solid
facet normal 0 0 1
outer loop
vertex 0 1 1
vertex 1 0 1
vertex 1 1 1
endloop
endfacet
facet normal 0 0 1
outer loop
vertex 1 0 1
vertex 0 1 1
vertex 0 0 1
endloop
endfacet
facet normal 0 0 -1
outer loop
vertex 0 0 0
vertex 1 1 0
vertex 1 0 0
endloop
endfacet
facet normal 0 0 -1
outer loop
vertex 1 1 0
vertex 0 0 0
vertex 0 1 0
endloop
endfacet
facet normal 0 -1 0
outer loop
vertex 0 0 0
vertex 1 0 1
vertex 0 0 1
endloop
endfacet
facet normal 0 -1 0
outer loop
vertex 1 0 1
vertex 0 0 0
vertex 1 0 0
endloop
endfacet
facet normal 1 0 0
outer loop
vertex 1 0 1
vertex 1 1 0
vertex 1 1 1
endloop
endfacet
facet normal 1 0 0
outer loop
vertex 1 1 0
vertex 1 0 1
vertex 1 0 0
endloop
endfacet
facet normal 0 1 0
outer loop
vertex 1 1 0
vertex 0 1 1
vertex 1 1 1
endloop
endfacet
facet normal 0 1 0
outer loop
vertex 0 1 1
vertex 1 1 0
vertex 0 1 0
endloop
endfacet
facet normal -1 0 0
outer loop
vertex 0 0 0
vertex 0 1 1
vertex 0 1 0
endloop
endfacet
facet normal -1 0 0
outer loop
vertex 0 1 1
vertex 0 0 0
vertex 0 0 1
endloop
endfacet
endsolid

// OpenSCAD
// file: Data.scad
dust=0;
filament=0;
gas=0;
star =
[
	[1.4,31.4,3,1063.653075],
	[4.5,92.6,3,1228.004618],
	[6,88.7,3,1063.653075],
	[6.7,74.7,3,1315.830655],
	[6.7,74.7,3,1130.316325],
	[8.9,17.9,3,2441.181106],
	[18.3,45.3,4,1475.027102],
	[20.8,98.9,3,1742.60919],
	[20.8,98.9,3,1611.387536],
	[22.2,46.1,4,3212.180934],
	[22.5,19.8,4,3518.843888],
	[23.6,18.8,4,16338.04169],
	[23.8,23.7,4,1310.991875],
	[23.8,23.7,4,1279.970617],
	[25.9,43,4,1958.844674],
	[27.8,68.5,4,1307.37447],
	[29.4,51.6,4,1090.435546],
	[31.5,34.9,3,22511.27016],
	[32.4,19.4,4,4195.657223],
	[32.6,38.1,3,7641.87624],
	[32.7,84.7,3,1618.825363],
	[34.7,42.9,3,7008.095316],
	[36.2,36.2,3,7184.557088],
	[37,35.7,3,4604.685784],
	[37.1,35.8,3,15617.08593],
	[38.9,38.2,3,6432.799273],
	[39.5,45,3,2839.226239],
	[43.9,97.6,3,11107.08256],
	[44.3,41.4,3,1274.089686],
	[45.2,61.3,3,9453.66046],
	[45.6,40.4,3,1509.384897],
	[45.6,40.4,3,1319.471457],
	[45.7,95.3,3,4685.975353],
	[48.2,78.1,3,1253.141175],
	[48.2,78.1,3,1302.566786],
	[48.7,72.2,3,1470.957077],
	[53.1,51.5,3,32448.90157],
	[56.1,0.9,3,3087.450476],
	[61,65.9,3,2135.99386],
	[61,65.9,4,2135.99386],
	[61.7,57.5,4,3787.913038],
	[62.7,45.1,4,1154.516117],
	[62.7,45.1,4,1102.554332],
	[66.8,55.6,4,1630.797361],
	[68.8,76.5,3,14521.11618],
	[68.9,76.5,3,4393.392456],
	[75.7,21.5,3,1986.094917],
	[78.9,100,3,62172.73893],
	[81.1,94,3,3144.850465],
	[84.3,18.4,3,2208.004733],
];
data = [star,filament,gas,dust];
// file: braille_font.scad
/*
Braille Module
http://creativecommons.org/licenses/by/3.0/
*/


// mm sizes from http://dots.physics.orst.edu/gs_layout.html
radius = 0.25;
spacing = 2.5;
distance = 3.75 + spacing;

plate_height = 10;
plate_thickness = 2;

$fn=35;



module letter(bitmap) {
	row_size = 2;
	col_size = 3;
	bitmap_size = row_size * col_size;
	
	function loc_x(loc) = floor(loc / row_size) * spacing + spacing;
	function loc_y(loc) = loc % row_size * spacing  + (distance-spacing)/2;

	for (loc = [0:bitmap_size - 1]) {
		if (bitmap[loc] != 0) {
			union() {
				translate(v = [loc_x(loc), loc_y(loc), 0]) {
					sphere(radius = radius* bitmap[loc], center = true);
				}
			}
		}
	}
}


module braille_char(char) {
	if (char == "A") {
		letter([
			1,0,
			0,0,
			0,0
		]);
	} else if (char == "B") {
		letter([
			1,0,
			1,0,
			0,0
		]);
	} else if (char == "C") {
		letter([
			1,1,
			0,0,
			0,0
		]);
	} else if (char == "D") {
		letter([
			1,1,
			0,1,
			0,0
		]);
	} else if (char == "E") {
		letter([
			1,0,
			0,1,
			0,0
		]);
	} else if (char == "F") {
		letter([
			1,1,
			1,0,
			0,0
		]);
	} else if (char == "G") {
		letter([
			1,1,
			1,1,
			0,0
		]);
	} else if (char == "H") {
		letter([
			1,0,
			1,1,
			0,0
		]);
	} else if (char == "I") {
		letter([
			0,1,
			1,0,
			0,0
		]);
	} else if (char == "J") {
		letter([
			0,1,
			1,1,
			0,0
		]);
	} else if (char == "K") {
		letter([
			1,0,
			0,0,
			1,0
		]);
	} else if (char == "L") {
		letter([
			1,0,
			1,0,
			1,0
		]);
	} else if (char == "M") {
		letter([
			1,1,
			0,0,
			1,0
		]);
	} else if (char == "N") {
		letter([
			1,1,
			0,1,
			1,0
		]);
	} else if (char == "O") {
		letter([
			1,0,
			0,1,
			1,0
		]);
	} else if (char == "P") {
		letter([
			1,1,
			1,0,
			1,0
		]);
	} else if (char == "Q") {
		letter([
			1,1,
			1,1,
			1,0
		]);
	} else if (char == "R") {
		letter([
			1,0,
			1,1,
			1,0
		]);
	} else if (char == "S") {
		letter([
			0,1,
			1,0,
			1,0
		]);
	} else if (char == "T") {
		letter([
			0,1,
			1,1,
			1,0
		]);
	} else if (char == "U") {
		letter([
			1,0,
			0,0,
			1,1
		]);
	} else if (char == "V") {
		letter([
			1,0,
			1,1,
			1,0
		]);
	} else if (char == "W") {
		letter([
			0,1,
			1,1,
			0,1
		]);
	} else if (char == "X") {
		letter([
			1,1,
			0,0,
			1,1
		]);
	} else if (char == "Y") {
		letter([
			1,1,
			0,1,
			1,1
		]);
	} else if (char == "Z") {
		letter([
			1,0,
			0,1,
			1,1
		]);
	} else {
		echo("Invalid Character: ", char);
	}

}

module braille_str(chars, char_count) {
	echo(str("Total Width: ", distance * char_count, "mm"));
	union() {
		for (count = [0:char_count-1]) {
			translate(v = [0, count * distance, plate_thickness]) {
				braille_char(chars[count]);
			}
		}
		translate(v = [0, -distance/2, 0]) {
			cube(size = [plate_height, distance * (char_count+1), plate_thickness]);
		}
	}
}






chars = ["C", "A", "R", "P", "E", " ", "D", "I", "E", "M" ];
char_count = 10;

union()
{
	rotate([0,90,0]) braille_str(chars, char_count);
	// uncomment next line to have a small "foot" added for better adhesion to the print platform or raft
	//translate([-19,20,-plate_height]) cube(size = [20,5,2]);
}
// main file
use <braille_font.scad>;
use <Data.scad>;
fn = 3;
pillar_diameter = 6.35;
pillar_radius = pillar_diameter/2;
pillar_height = 70;
base_boundaries = ([100,120,5]);
Title = 10;
max_plate_height = base_boundaries[2];
max_plate_height = 3;


braille_radius = 1;
braille_plate_height = 10;
braille_plate_thickness = 2;
spacing = 2.5;
distance = 3.75 + spacing;
Emboss = 2;

scaling = (.90);
transX = (5);
transY = (3);

move = -90.230965;
inkscale = 2.538071037;


star =
[
	[1.4,31.4,3,1063.653075],
	[4.5,92.6,3,1228.004618],
	[6,88.7,3,1063.653075],
	[6.7,74.7,3,1315.830655],
	[6.7,74.7,3,1130.316325],
	[8.9,17.9,3,2441.181106],
	[18.3,45.3,4,1475.027102],
	[20.8,98.9,3,1742.60919],
	[20.8,98.9,3,1611.387536],
	[22.2,46.1,4,3212.180934],
	[22.5,19.8,4,3518.843888],
	[23.6,18.8,4,16338.04169],
	[23.8,23.7,4,1310.991875],
	[23.8,23.7,4,1279.970617],
	[25.9,43,4,1958.844674],
	[27.8,68.5,4,1307.37447],
	[29.4,51.6,4,1090.435546],
	[31.5,34.9,3,22511.27016],
	[32.4,19.4,4,4195.657223],
	[32.6,38.1,3,7641.87624],
	[32.7,84.7,3,1618.825363],
	[34.7,42.9,3,7008.095316],
	[36.2,36.2,3,7184.557088],
	[37,35.7,3,4604.685784],
	[37.1,35.8,3,15617.08593],
	[38.9,38.2,3,6432.799273],
	[39.5,45,3,2839.226239],
	[43.9,97.6,3,11107.08256],
	[44.3,41.4,3,1274.089686],
	[45.2,61.3,3,9453.66046],
	[45.6,40.4,3,1509.384897],
	[45.6,40.4,3,1319.471457],
	[45.7,95.3,3,4685.975353],
	[48.2,78.1,3,1253.141175],
	[48.2,78.1,3,1302.566786],
	[48.7,72.2,3,1470.957077],
	[53.1,51.5,3,32448.90157],
	[56.1,0.9,3,3087.450476],
	[61,65.9,3,2135.99386],
	[61,65.9,4,2135.99386],
	[61.7,57.5,4,3787.913038],
	[62.7,45.1,4,1154.516117],
	[62.7,45.1,4,1102.554332],
	[66.8,55.6,4,1630.797361],
	[68.8,76.5,3,14521.11618],
	[68.9,76.5,3,4393.392456],
	[75.7,21.5,3,1986.094917],
	[78.9,100,3,62172.73893],
	[81.1,94,3,3144.850465],
	[84.3,18.4,3,2208.004733],
];

gasses =
[
	[21.2,36,0      ,240.6,0      ,120.3,360.9],
	[26,40.7,0      ,195.8,0      ,97.9,293.7],
	[26,36,0      ,188.1333333,0      ,94.06666667,282.2],
	[30.5,55.1,0      ,77.2,0      ,38.6,115.8],
	[30.5,50.3,0      ,116.2666667,0      ,58.13333333,174.4],
	[30.5,45.5,0      ,146.4666667,0      ,73.23333333,219.7],
	[30.5,40.7,0      ,127.8666667,0      ,63.93333333,191.8],
	[30.5,36,0      ,285.8666667,0      ,142.9333333,428.8],
	[30.5,31.2,0      ,185,0      ,92.5,277.5],
	[35.3,50.3,0      ,105.2666667,0      ,52.63333333,157.9],
	[35.3,45.5,0      ,112.6666667,0      ,56.33333333,169],
	[35.3,40.7,0      ,116.6,0      ,58.3,174.9],
	[35.3,36,0      ,303.5333333,0      ,151.7666667,455.3],
	[35.3,31.2,0      ,254.2,0      ,127.1,381.3],
	[39.9,50.3,0      ,76.13333333,0      ,38.06666667,114.2],
	[39.9,45.5,0      ,205,0      ,102.5,307.5],
	[39.9,40.7,0      ,118.4,0      ,59.2,177.6],
	[39.9,36,0      ,163.4,0      ,81.7,245.1],
	[39.9,31.2,0      ,208.9333333,0      ,104.4666667,313.4],
	[39.9,26.4,0      ,213.8666667,0      ,106.9333333,320.8],
	[44.7,59.9,0      ,104.4,0      ,52.2,156.6],
	[44.7,55.1,0      ,105.2,0      ,52.6,157.8],
	[44.7,50.3,0      ,107.5333333,0      ,53.76666667,161.3],
	[44.7,45.5,0      ,144.5333333,0      ,72.26666667,216.8],
	[44.7,40.7,0      ,158.8,0      ,79.4,238.2],
	[44.7,36,0      ,154.0666667,0      ,77.03333333,231.1],
	[44.7,31.2,0      ,164.7333333,0      ,82.36666667,247.1],
	[44.7,26.4,0      ,172,0      ,86,258],
	[44.7,21.6,0      ,151.5333333,0      ,75.76666667,227.3],
	[49.2,69.4,0      ,88.26666667,0      ,44.13333333,132.4],
	[49.2,64.6,0      ,99.4,0      ,49.7,149.1],
	[49.2,59.9,0      ,97.93333333,0      ,48.96666667,146.9],
	[49.2,55.1,0      ,127.8,0      ,63.9,191.7],
	[49.2,50.3,0      ,113.6,0      ,56.8,170.4],
	[49.2,45.5,0      ,143.2666667,0      ,71.63333333,214.9],
	[49.2,40.7,0      ,180.3333333,0      ,90.16666667,270.5],
	[49.2,36,0      ,136.8666667,0      ,68.43333333,205.3],
	[49.2,31.2,0      ,142.4666667,0      ,71.23333333,213.7],
	[49.2,26.4,0      ,144.3333333,0      ,72.16666667,216.5],
	[49.2,21.6,0      ,112.3333333,0      ,56.16666667,168.5],
	[54,69.4,0      ,96.26666667,0      ,48.13333333,144.4],
	[54,64.6,0      ,106.2,0      ,53.1,159.3],
	[54,59.9,0      ,111.7333333,0      ,55.86666667,167.6],
	[54,55.1,0      ,145.2666667,0      ,72.63333333,217.9],
	[54,50.3,0      ,226.0666667,0      ,113.0333333,339.1],
	[54,45.5,0      ,165.0666667,0      ,82.53333333,247.6],
	[54,40.7,0      ,181.4,0      ,90.7,272.1],
	[54,36,0      ,131.1333333,0      ,65.56666667,196.7],
	[54,31.2,0      ,143.7333333,0      ,71.86666667,215.6],
	[54,26.4,0      ,130.5333333,0      ,65.26666667,195.8],
	[54,21.6,0      ,111.5333333,0      ,55.76666667,167.3],
	[54,16.8,0      ,112.2666667,0      ,56.13333333,168.4],
	[58.6,59.9,0      ,152.0666667,0      ,76.03333333,228.1],
	[58.6,55.1,0      ,167.7333333,0      ,83.86666667,251.6],
	[58.6,50.3,0      ,120.6666667,0      ,60.33333333,181],
	[58.6,45.5,0      ,149.6,0      ,74.8,224.4],
	[58.6,40.7,0      ,125.8666667,0      ,62.93333333,188.8],
	[58.6,36,0      ,115.4666667,0      ,57.73333333,173.2],
	[58.6,31.2,0      ,124.6666667,0      ,62.33333333,187],
	[58.6,26.4,0      ,114.4666667,0      ,57.23333333,171.7],
	[58.6,21.6,0      ,99.13333333,0      ,49.56666667,148.7],
	[58.6,16.8,0      ,83.4,0      ,41.7,125.1],
	[63.4,45.5,0      ,133.3333333,0      ,66.66666667,200],
	[63.4,40.7,0      ,110.4,0      ,55.2,165.6],
	[63.4,36,0      ,86.66666667,0      ,43.33333333,130],
	[63.4,31.2,0      ,88.13333333,0      ,44.06666667,132.2],
	[63.4,26.4,0      ,93.6,0      ,46.8,140.4],
	[67.9,40.7,0      ,119.3333333,0      ,59.66666667,179],
	[67.9,36,0      ,75.86666667,0      ,37.93333333,113.8],
	[67.9,26.4,0      ,82.4,0      ,41.2,123.6]
];

dust =
[
	[2.4,40.7,0      ,12.92,0      ,25.84,38.76],
	[2.4,45.5,0      ,12.70666667,0      ,25.41333333,38.12],
	[2.4,50.3,0      ,25.19,0      ,50.38,75.57],
	[2.4,55.1,0      ,10.28,0      ,20.56,30.84],
	[7.1,36,0      ,18.86666667,0      ,37.73333333,56.6],
	[7.1,40.7,0      ,13.72,0      ,27.44,41.16],
	[7.1,45.5,0      ,15.14333333,0      ,30.28666667,45.43],
	[7.1,50.3,0      ,26.64,0      ,53.28,79.92],
	[7.1,55.1,0      ,11.26666667,0      ,22.53333333,33.8],
	[7.1,59.9,0      ,10.60333333,0      ,21.20666667,31.81],
	[7.1,64.7,0      ,10.22,0      ,20.44,30.66],
	[11.9,45.5,0      ,13.76333333,0      ,27.52666667,41.29],
	[11.9,50.3,0      ,14.28,0      ,28.56,42.84],
	[11.9,55.1,0      ,13.13333333,0      ,26.26666667,39.4],
	[11.9,59.9,0      ,12.94333333,0      ,25.88666667,38.83],
	[11.9,64.7,0      ,14.42666667,0      ,28.85333333,43.28],
	[11.9,69.5,0      ,10.07,0      ,20.14,30.21],
	[16.4,50.3,0      ,17.34333333,0      ,34.68666667,52.03],
	[16.4,55.1,0      ,15.64666667,0      ,31.29333333,46.94],
	[16.4,59.9,0      ,12.51333333,0      ,25.02666667,37.54],
	[16.4,64.7,0      ,10.09,0      ,20.18,30.27],
	[16.4,69.5,0      ,9.65,0      ,19.3,28.95],
	[21.2,59.9,0      ,12.08333333,0      ,24.16666667,36.25],
	[21.2,64.7,0      ,10.35333333,0      ,20.70666667,31.06],
	[21.2,69.5,0      ,11.56333333,0      ,23.12666667,34.69],
	[21.2,16.8,0      ,16.18333333,0      ,32.36666667,48.55],
	[26,12,0      ,18.42,0      ,36.84,55.26],
	[30.6,12,0      ,18.97333333,0      ,37.94666667,56.92],
	[35.3,12,0      ,17.02666667,0      ,34.05333333,51.08],
	[39.9,7.2,0      ,16.82333333,0      ,33.64666667,50.47],
	[44.7,7.2,0      ,17.27,0      ,34.54,51.81],
	[49.3,7.2,0      ,16.06333333,0      ,32.12666667,48.19],
	[54,2.4,0      ,12.3,0      ,24.6,36.9],
	[54,7.2,0      ,15.23,0      ,30.46,45.69],
	[58.6,2.4,0      ,14.34,0      ,28.68,43.02],
	[58.6,7.2,0      ,14.12,0      ,28.24,42.36],
	[58.6,12,0      ,16.05666667,0      ,32.11333333,48.17],
	[63.4,7.2,0      ,13.92666667,0      ,27.85333333,41.78],
	[63.4,12,0      ,11.73,0      ,23.46,35.19],
	[68,7.2,0      ,11.29,0      ,22.58,33.87],
	[68,12,0      ,10.49666667,0      ,20.99333333,31.49],
	[72.7,7.2,0      ,12.91666667,0      ,25.83333333,38.75],
	[72.7,12,0      ,14.52,0      ,29.04,43.56],
	[72.7,16.8,0      ,10.63333333,0      ,21.26666667,31.9],
	[72.7,21.6,0      ,12.51666667,0      ,25.03333333,37.55],
	[77.3,16.8,0      ,10.56333333,0      ,21.12666667,31.69],
	[77.3,21.6,0      ,12.54333333,0      ,25.08666667,37.63],
	[77.3,36,0      ,11.28333333,0      ,22.56666667,33.85],
	[77.3,74.2,0      ,12.27333333,0      ,24.54666667,36.82],
	[82.1,16.8,0      ,11.57333333,0      ,23.14666667,34.72],
	[82.1,21.6,0      ,8.926666667,0      ,17.85333333,26.78],
	[82.1,40.7,0      ,12.83333333,0      ,25.66666667,38.5],
	[82.1,45.5,0      ,12.26666667,0      ,24.53333333,36.8],
	[82.1,79,0      ,9.263333333,0      ,18.52666667,27.79],
	[86.7,16.8,0      ,8.976666667,0      ,17.95333333,26.93],
	[86.7,21.6,0      ,9.14,0      ,18.28,27.42],
	[86.7,59.9,0      ,14.07,0      ,28.14,42.21],
	[86.7,69.5,0      ,6.833333333,0      ,13.66666667,20.5],
	[91.4,21.6,0      ,11.16333333,0      ,22.32666667,33.49],
	[91.4,26.4,0      ,12.84666667,0      ,25.69333333,38.54],
	[91.4,31.2,0      ,10.58333333,0      ,21.16666667,31.75],
	[96,31.2,0      ,14.58333333,0      ,29.16666667,43.75],
	[96,36,0      ,20.15,0      ,40.3,60.45]
];


gas_dust=
[
	[11.8,40.7,0      ,74.7,0      ,74.7,149.4],
	[11.8,31.2,0      ,74.35,0      ,74.35,148.7],
	[21.2,55.1,0      ,65.95,0      ,65.95,131.9],
	[21.2,50.3,0      ,74.35,0      ,74.35,148.7],
	[21.2,21.6,0      ,76.35,0      ,76.35,152.7],
	[26,16.8,0      ,69.65,0      ,69.65,139.3],
	[30.5,26.4,0      ,228.6,0      ,228.6,457.2],
	[35.3,26.4,0      ,225,0      ,225,450],
	[35.3,21.6,0      ,178.55,0      ,178.55,357.1],
	[39.9,21.6,0      ,133.95,0      ,133.95,267.9],
	[39.9,12,0      ,65.4,0      ,65.4,130.8],
	[44.7,12,0      ,68.75,0      ,68.75,137.5],
	[58.6,74.2,0      ,51.25,0      ,51.25,102.5],
	[63.4,74.2,0      ,56.5,0      ,56.5,113],
	[67.9,74.2,0      ,93.75,0      ,93.75,187.5],
	[72.7,74.2,0      ,63.3,0      ,63.3,126.6],
	[72.7,59.9,0      ,115.6,0      ,115.6,231.2],
	[72.7,55.1,0      ,101.95,0      ,101.95,203.9],
	[72.7,50.3,0      ,89.15,0      ,89.15,178.3],
	[77.3,69.4,0      ,75.9,0      ,75.9,151.8],
	[77.3,64.6,0      ,105.4,0      ,105.4,210.8],
	[77.3,59.9,0      ,110.5,0      ,110.5,221],
	[77.3,55.1,0      ,96.35,0      ,96.35,192.7],
	[77.3,50.3,0      ,93.55,0      ,93.55,187.1],
	[77.3,45.5,0      ,80.4,0      ,80.4,160.8],
	[77.3,40.7,0      ,64.45,0      ,64.45,128.9],
	[82.1,64.6,0      ,60.45,0      ,60.45,120.9],
	[82.1,59.9,0      ,79.75,0      ,79.75,159.5],
	[82.1,55.1,0      ,83.3,0      ,83.3,166.6],
	[82.1,50.3,0      ,73.85,0      ,73.85,147.7]
];


module triangle (s,h) {
//r=(s/2)/sin(60);
r = s;
	linear_extrude(height = h){
		polygon(points=[[-sin(60)*r,-sin(30)*r],[sin(60)*r,-sin(30)*r],[0,r]],triangle=[[0,1,2]]);
	}
}

Standard = 5;
//X-cord,Y-cord,Layer,Intensity

module star(Standard,Intensity,loc){
Intensity2=Intensity*4-4;
	translate([loc[0],loc[1],0]){
		scale([1,1,1]){
			color("Purple")linear_extrude(height=Intensity2)circle(Standard*.8,$fn=fn);
		}
	}
}

module gas(Standard,x,y,z){
	translate([x,y,0]){
		scale([1,1,1]){
			color("Magenta")cube([Standard,Standard,z]);
		}
	}
}

module object(Standard,x,y,z){
	translate([x,y,z/2]){
		scale([1,1,1]){
			cube([Standard,Standard,z],center=true);
		}
	}
}

module drawing(i){
	if(i==1){
		scale(scaling/.95){
			translate([0,move,base_boundaries[2]/2]){
				scale(inkscale){
					color("Blue")linear_extrude(file = "v4_NGC_602.dxf", height = Emboss, layer = "Filaments");
				}
			}
		}
	}
	if(i==2||i==3||i==4){
		scale(scaling/.95){
			translate([0,move,base_boundaries[2]/2]){
				scale(inkscale){
					color("Red")linear_extrude(file = "v4_NGC_602.dxf", height = Emboss, layer = "Gasses");
				}
			}
		}
		scale(scaling/.95){
			translate([0,move,base_boundaries[2]/2]){
				scale(inkscale){
					color("White")linear_extrude(file = "v4_NGC_602.dxf", height = Emboss, layer = "Dust");
				}
			}
		}
	}
}

module drawing2(i){
	if(i==1){
		scale(scaling/.95){
			translate([0,move,base_boundaries[2]/2]){
				scale(inkscale){
					color("Blue")linear_extrude(file = "v4_NGC_602.dxf", height = Emboss, layer = "Filaments");
				}
			}
		}
	}
	if(i==2||i==3||i==4){
		scale(scaling/.95){
			translate([0,move,base_boundaries[2]/2]){
				scale(inkscale){
					color("Red")linear_extrude(file = "v4_NGC_602.dxf", height = Emboss, layer = "Gasses_t");
				}
			}
		}
		scale(scaling/.95){
			translate([0,move,base_boundaries[2]/2]){
				scale(inkscale){
					color("White")linear_extrude(file = "v4_NGC_602.dxf", height = Emboss, layer = "Dust_t");
				}
			}
		}
		scale(scaling/.95){
			translate([0,17.687,base_boundaries[2]/2]){
				scale(inkscale){
					color("Blue")linear_extrude(file = "v4_NGC_602.dxf", height = Emboss+1, layer = "Gas_Dust_t");
				}
			}
		}
	}
}

module drawing3(i){
k=2;
K=120/2/k;
h=3;
H=120/2/h;
	if(i==1){
		scale(scaling/.95){
			translate([0,move,base_boundaries[2]/2]){
				scale(inkscale){
					color("Blue")linear_extrude(file = "v4_NGC_602.dxf", height = Emboss, layer = "Filaments");
				}
			}
		}
	}
	if(i==2||i==3||i==4){
		//intersection(){
			scale(scaling/.95){
				translate([0,move,base_boundaries[2]/2]){
					scale(inkscale){
						color("Red")linear_extrude(file = "v5_NGC_602.dxf", height =(Emboss)/inkscale/.95, layer = "Gasses_t");
					}
				}
			}
//			for(i=[0:H]){
//				translate([i*2*h,0,0]){
//					for(i=[0:H]){
//						translate([0,i*2*h,base_boundaries[2]/2]){
//							triangle(h,(Emboss*3));
//						}
//					}
//				}
//			}
//
//		}
		//intersection(){
			scale(scaling/.95){
				translate([0,move,base_boundaries[2]/2/.95]){
					scale(inkscale){
						color("green")linear_extrude(file = "v5_NGC_602.dxf", height = (Emboss*3)/inkscale/.95, layer = "Dust_t");
					}
				}
			}
//			for(i=[0:K]){
//				translate([0,i*2*k,base_boundaries[2]/2]){
//					cube([120,k,(Emboss*3)]);
//				}
//			}
//		}
		//intersection(){
			scale(scaling/.95){
				translate([0,17.687,base_boundaries[2]/2]){
					scale(inkscale){
						color("Blue")linear_extrude(file = "v5_NGC_602.dxf", height = (Emboss*2)/inkscale, layer = "Gas_Dust_t");
					}
				}
			}
//			for(i=[0:K]){
//				translate([i*2*k,0,base_boundaries[2]/2]){
//					cube([k,120,Emboss*3]);
//				}
//			}
//		}
	}
}

module tab(thickness){
	linear_extrude(height=thickness){
		difference(){
			hull(){
				circle(pillar_radius*2,$fn=fn);
				translate([pillar_radius,pillar_radius,0]){
					intersection(){
						circle(pillar_radius*2.832,$fn=fn);
						square(pillar_radius*4);
					}
				}
			}
			circle(pillar_radius,$fn=fn);
			translate([pillar_radius*3,pillar_radius*3,0]){
				rotate([0,0,45]){
					square(pillar_radius*5,center = true);
				}
			}
		}
	}
}

module pillar(pillar_radius,pillar_height){
	linear_extrude(height=pillar_height){
		circle(pillar_radius,$fn=fn);
	}
}

module base(){
	translate([0,0,0]){
		cube([base_boundaries[0],base_boundaries[1]-pillar_radius*3,base_boundaries[2]]);
	}
	translate([pillar_radius*2,base_boundaries[1]-pillar_radius*2,0]){
		rotate([0,0,-135]){
			tab(base_boundaries[2]);
		}
	}
	translate([base_boundaries[0]-pillar_radius*2,base_boundaries[1]-pillar_radius*2,0]){
		rotate([0,0,-135]){
			tab(base_boundaries[2]);
		}
	}
	translate([pillar_radius*2,base_boundaries[1]-pillar_radius*2,0]){
		pillar(pillar_radius,pillar_height);
	}
	translate([base_boundaries[0]-pillar_radius*2,base_boundaries[1]-pillar_radius*2,0]){
		pillar(pillar_radius,pillar_height);
	}
}



module plate(){
	difference(){
		translate([0,0,0]){
			cube([base_boundaries[0],base_boundaries[1]-pillar_radius*3,base_boundaries[2]-braille_radius]);
		}
		translate([-1,-1,base_boundaries[2]/2]){
			cube([base_boundaries[0]+2,base_boundaries[1]-pillar_radius*3-Title+1,base_boundaries[2]]);
		}
	}
	translate([pillar_radius*2,base_boundaries[1]-pillar_radius*2,0]){
		rotate([0,0,-135]){
			tab(max_plate_height);
		}
	}
	translate([base_boundaries[0]-pillar_radius*2,base_boundaries[1]-pillar_radius*2,0]){
		rotate([0,0,-135]){
			tab(max_plate_height);
		}
	}
}

module plate1(){
	chars = ["O", "N", "E"];
	char_count = 3;
	Total_width = distance*char_count+distance;

	translate([distance/2+base_boundaries[0]/2-Total_width/2,braille_plate_height+base_boundaries[1]-pillar_radius*3-Title,base_boundaries[2]-braille_plate_thickness-braille_radius]){
		rotate ([0,0,-90]){
			braille_str(chars, char_count);
		}
	}
	plate();
	translate([transX,transY,0]){
		drawing2(1);
	}
}

module plate2(){
	chars = ["T", "W", "O"];
	char_count = 3;
	Total_width = distance*char_count+distance;

	translate([distance/2+base_boundaries[0]/2-Total_width/2,braille_plate_height+base_boundaries[1]-pillar_radius*3-Title,base_boundaries[2]-braille_plate_thickness-braille_radius]){
		rotate ([0,0,-90]){
			braille_str(chars, char_count);
		}
	}
	plate();
	translate([transX,transY,0]){
		drawing3(2);
	}
}

module plate3(){
	chars = ["T", "H", "R", "E", "E"];
	char_count = 5;
	Total_width = distance*char_count+distance;

	translate([distance/2+base_boundaries[0]/2-Total_width/2,braille_plate_height+base_boundaries[1]-pillar_radius*3-Title,base_boundaries[2]-braille_plate_thickness-braille_radius]){
		rotate ([0,0,-90]){
			braille_str(chars, char_count);
		}
	}
	plate();
	translate([transX,transY,0]){
		scale([scaling,scaling,1]){
			for(i=[0:49]){
				if(star[i][2]==3){
					star(Standard,log(star[i][3])+.75,star[i]);
				}
			}
		}
	drawing3(3);
	}
}

module plate4(){
	chars = ["F", "O", "U", "R"];
	char_count = 4;
	Total_width = distance*char_count+distance;

	translate([distance/2+base_boundaries[0]/2-Total_width/2,braille_plate_height+base_boundaries[1]-pillar_radius*3-Title,base_boundaries[2]-braille_plate_thickness-braille_radius]){
		rotate ([0,0,-90]){
			braille_str(chars, char_count);
		}
	}
	plate();
	translate([transX,transY,0]){
		scale([scaling,scaling,1]){
			for(i=[0:49]){
				if(star[i][2]==4){
					star(Standard,log(star[i][3]),star[i]);
				}
			}
		}
	}
	drawing3(4);
}


module bits(){
//	translate([-4,-4,0]){
		translate([transX,transY,15]){
			scale([scaling,scaling,1]){
				for(i=[0:69]){
					translate([0,0,0])color("silver")object(Standard,gasses[i][0],gasses[i][1],gasses[i][3]/30+3);
		
				}
			}
		}
//	}
	translate([transX,transY,0]){
		scale([scaling,scaling,1]){
			for(i=[0:29]){
				translate([0,0,20])color("Maroon")object(Standard,gas_dust[i][0],gas_dust[i][1],gas_dust[i][3]/30+3);
	
			}
		}
	}
	translate([transX,transY,0]){
		scale([scaling,scaling,1]){
			for(i=[0:62]){
				translate([0,0,40])color("Lime")object(Standard,dust[i][0],dust[i][1],dust[i][3]/3);
	
			}
		}
	}
}

module assembly(i){
//	%cube(base_boundaries);

	base();

	translate([0,0,(base_boundaries[2]+i)]){
		plate4();
	}
	translate([0,0,(base_boundaries[2]+i)*2]){
		plate3();
	}
	translate([0,0,(base_boundaries[2]+i)*3]){
		plate2();
	}
	translate([0,0,(base_boundaries[2]+i)*4]){
		plate1();
	}


}

module assembly2(j){
	for(i=[0:4]){
		translate([(base_boundaries[0]*i+j*i),0,0]){
			if(i==0){
				base();
			}
			if(i==1){
				plate1();
			}
			if(i==2){
				plate2();
			}
			if(i==3){
				plate3();
			}
			if(i==4){
				plate4();
			}
		}
	}
}


//cube(.1);

//assembly(40);


//assembly2(10);

//
//drawing2(4);
//
//
//bits();

//plate3();


//%drawing3(3);

module test(x,y,z){
	if(x==1){
//	difference(){
		scale(scaling/.95){
			translate([0,move,base_boundaries[2]/2]){
				scale(inkscale){
					color("Red")linear_extrude(file = "v5_NGC_602.dxf", height =(Emboss)/inkscale/.95, layer = "Gasses");
				}
			}
		}
	}
	if(y==1){
		scale(scaling/.95){
			translate([0,17.687,base_boundaries[2]/2]){
				scale(inkscale){
					color("Blue")linear_extrude(file = "v5_NGC_602.dxf", height = (Emboss*2)/inkscale, layer = "Gas_Dust");
				}
			}
		}
	}

	if(z==1){
		scale(scaling/.95){
			translate([0,move,base_boundaries[2]/2/.95]){
				scale(inkscale){
					color("green")linear_extrude(file = "v5_NGC_602.dxf", height = (Emboss*3)/inkscale/.95, layer = "Dust");
				}
			}
		}
	}
}
cube(1);
test(1,0,1);
